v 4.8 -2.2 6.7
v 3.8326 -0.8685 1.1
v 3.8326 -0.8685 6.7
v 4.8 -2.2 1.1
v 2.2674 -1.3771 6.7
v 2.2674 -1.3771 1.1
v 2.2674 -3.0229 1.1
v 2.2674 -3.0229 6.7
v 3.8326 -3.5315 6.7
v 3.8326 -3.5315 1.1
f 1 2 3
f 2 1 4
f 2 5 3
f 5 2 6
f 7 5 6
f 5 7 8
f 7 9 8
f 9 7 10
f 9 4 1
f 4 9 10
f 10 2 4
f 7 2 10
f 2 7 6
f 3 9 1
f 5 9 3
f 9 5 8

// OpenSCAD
union() {
  translate([3.4, -2.2, 1.1]) cylinder(h=5.6, r=1.4, center=false);
}
